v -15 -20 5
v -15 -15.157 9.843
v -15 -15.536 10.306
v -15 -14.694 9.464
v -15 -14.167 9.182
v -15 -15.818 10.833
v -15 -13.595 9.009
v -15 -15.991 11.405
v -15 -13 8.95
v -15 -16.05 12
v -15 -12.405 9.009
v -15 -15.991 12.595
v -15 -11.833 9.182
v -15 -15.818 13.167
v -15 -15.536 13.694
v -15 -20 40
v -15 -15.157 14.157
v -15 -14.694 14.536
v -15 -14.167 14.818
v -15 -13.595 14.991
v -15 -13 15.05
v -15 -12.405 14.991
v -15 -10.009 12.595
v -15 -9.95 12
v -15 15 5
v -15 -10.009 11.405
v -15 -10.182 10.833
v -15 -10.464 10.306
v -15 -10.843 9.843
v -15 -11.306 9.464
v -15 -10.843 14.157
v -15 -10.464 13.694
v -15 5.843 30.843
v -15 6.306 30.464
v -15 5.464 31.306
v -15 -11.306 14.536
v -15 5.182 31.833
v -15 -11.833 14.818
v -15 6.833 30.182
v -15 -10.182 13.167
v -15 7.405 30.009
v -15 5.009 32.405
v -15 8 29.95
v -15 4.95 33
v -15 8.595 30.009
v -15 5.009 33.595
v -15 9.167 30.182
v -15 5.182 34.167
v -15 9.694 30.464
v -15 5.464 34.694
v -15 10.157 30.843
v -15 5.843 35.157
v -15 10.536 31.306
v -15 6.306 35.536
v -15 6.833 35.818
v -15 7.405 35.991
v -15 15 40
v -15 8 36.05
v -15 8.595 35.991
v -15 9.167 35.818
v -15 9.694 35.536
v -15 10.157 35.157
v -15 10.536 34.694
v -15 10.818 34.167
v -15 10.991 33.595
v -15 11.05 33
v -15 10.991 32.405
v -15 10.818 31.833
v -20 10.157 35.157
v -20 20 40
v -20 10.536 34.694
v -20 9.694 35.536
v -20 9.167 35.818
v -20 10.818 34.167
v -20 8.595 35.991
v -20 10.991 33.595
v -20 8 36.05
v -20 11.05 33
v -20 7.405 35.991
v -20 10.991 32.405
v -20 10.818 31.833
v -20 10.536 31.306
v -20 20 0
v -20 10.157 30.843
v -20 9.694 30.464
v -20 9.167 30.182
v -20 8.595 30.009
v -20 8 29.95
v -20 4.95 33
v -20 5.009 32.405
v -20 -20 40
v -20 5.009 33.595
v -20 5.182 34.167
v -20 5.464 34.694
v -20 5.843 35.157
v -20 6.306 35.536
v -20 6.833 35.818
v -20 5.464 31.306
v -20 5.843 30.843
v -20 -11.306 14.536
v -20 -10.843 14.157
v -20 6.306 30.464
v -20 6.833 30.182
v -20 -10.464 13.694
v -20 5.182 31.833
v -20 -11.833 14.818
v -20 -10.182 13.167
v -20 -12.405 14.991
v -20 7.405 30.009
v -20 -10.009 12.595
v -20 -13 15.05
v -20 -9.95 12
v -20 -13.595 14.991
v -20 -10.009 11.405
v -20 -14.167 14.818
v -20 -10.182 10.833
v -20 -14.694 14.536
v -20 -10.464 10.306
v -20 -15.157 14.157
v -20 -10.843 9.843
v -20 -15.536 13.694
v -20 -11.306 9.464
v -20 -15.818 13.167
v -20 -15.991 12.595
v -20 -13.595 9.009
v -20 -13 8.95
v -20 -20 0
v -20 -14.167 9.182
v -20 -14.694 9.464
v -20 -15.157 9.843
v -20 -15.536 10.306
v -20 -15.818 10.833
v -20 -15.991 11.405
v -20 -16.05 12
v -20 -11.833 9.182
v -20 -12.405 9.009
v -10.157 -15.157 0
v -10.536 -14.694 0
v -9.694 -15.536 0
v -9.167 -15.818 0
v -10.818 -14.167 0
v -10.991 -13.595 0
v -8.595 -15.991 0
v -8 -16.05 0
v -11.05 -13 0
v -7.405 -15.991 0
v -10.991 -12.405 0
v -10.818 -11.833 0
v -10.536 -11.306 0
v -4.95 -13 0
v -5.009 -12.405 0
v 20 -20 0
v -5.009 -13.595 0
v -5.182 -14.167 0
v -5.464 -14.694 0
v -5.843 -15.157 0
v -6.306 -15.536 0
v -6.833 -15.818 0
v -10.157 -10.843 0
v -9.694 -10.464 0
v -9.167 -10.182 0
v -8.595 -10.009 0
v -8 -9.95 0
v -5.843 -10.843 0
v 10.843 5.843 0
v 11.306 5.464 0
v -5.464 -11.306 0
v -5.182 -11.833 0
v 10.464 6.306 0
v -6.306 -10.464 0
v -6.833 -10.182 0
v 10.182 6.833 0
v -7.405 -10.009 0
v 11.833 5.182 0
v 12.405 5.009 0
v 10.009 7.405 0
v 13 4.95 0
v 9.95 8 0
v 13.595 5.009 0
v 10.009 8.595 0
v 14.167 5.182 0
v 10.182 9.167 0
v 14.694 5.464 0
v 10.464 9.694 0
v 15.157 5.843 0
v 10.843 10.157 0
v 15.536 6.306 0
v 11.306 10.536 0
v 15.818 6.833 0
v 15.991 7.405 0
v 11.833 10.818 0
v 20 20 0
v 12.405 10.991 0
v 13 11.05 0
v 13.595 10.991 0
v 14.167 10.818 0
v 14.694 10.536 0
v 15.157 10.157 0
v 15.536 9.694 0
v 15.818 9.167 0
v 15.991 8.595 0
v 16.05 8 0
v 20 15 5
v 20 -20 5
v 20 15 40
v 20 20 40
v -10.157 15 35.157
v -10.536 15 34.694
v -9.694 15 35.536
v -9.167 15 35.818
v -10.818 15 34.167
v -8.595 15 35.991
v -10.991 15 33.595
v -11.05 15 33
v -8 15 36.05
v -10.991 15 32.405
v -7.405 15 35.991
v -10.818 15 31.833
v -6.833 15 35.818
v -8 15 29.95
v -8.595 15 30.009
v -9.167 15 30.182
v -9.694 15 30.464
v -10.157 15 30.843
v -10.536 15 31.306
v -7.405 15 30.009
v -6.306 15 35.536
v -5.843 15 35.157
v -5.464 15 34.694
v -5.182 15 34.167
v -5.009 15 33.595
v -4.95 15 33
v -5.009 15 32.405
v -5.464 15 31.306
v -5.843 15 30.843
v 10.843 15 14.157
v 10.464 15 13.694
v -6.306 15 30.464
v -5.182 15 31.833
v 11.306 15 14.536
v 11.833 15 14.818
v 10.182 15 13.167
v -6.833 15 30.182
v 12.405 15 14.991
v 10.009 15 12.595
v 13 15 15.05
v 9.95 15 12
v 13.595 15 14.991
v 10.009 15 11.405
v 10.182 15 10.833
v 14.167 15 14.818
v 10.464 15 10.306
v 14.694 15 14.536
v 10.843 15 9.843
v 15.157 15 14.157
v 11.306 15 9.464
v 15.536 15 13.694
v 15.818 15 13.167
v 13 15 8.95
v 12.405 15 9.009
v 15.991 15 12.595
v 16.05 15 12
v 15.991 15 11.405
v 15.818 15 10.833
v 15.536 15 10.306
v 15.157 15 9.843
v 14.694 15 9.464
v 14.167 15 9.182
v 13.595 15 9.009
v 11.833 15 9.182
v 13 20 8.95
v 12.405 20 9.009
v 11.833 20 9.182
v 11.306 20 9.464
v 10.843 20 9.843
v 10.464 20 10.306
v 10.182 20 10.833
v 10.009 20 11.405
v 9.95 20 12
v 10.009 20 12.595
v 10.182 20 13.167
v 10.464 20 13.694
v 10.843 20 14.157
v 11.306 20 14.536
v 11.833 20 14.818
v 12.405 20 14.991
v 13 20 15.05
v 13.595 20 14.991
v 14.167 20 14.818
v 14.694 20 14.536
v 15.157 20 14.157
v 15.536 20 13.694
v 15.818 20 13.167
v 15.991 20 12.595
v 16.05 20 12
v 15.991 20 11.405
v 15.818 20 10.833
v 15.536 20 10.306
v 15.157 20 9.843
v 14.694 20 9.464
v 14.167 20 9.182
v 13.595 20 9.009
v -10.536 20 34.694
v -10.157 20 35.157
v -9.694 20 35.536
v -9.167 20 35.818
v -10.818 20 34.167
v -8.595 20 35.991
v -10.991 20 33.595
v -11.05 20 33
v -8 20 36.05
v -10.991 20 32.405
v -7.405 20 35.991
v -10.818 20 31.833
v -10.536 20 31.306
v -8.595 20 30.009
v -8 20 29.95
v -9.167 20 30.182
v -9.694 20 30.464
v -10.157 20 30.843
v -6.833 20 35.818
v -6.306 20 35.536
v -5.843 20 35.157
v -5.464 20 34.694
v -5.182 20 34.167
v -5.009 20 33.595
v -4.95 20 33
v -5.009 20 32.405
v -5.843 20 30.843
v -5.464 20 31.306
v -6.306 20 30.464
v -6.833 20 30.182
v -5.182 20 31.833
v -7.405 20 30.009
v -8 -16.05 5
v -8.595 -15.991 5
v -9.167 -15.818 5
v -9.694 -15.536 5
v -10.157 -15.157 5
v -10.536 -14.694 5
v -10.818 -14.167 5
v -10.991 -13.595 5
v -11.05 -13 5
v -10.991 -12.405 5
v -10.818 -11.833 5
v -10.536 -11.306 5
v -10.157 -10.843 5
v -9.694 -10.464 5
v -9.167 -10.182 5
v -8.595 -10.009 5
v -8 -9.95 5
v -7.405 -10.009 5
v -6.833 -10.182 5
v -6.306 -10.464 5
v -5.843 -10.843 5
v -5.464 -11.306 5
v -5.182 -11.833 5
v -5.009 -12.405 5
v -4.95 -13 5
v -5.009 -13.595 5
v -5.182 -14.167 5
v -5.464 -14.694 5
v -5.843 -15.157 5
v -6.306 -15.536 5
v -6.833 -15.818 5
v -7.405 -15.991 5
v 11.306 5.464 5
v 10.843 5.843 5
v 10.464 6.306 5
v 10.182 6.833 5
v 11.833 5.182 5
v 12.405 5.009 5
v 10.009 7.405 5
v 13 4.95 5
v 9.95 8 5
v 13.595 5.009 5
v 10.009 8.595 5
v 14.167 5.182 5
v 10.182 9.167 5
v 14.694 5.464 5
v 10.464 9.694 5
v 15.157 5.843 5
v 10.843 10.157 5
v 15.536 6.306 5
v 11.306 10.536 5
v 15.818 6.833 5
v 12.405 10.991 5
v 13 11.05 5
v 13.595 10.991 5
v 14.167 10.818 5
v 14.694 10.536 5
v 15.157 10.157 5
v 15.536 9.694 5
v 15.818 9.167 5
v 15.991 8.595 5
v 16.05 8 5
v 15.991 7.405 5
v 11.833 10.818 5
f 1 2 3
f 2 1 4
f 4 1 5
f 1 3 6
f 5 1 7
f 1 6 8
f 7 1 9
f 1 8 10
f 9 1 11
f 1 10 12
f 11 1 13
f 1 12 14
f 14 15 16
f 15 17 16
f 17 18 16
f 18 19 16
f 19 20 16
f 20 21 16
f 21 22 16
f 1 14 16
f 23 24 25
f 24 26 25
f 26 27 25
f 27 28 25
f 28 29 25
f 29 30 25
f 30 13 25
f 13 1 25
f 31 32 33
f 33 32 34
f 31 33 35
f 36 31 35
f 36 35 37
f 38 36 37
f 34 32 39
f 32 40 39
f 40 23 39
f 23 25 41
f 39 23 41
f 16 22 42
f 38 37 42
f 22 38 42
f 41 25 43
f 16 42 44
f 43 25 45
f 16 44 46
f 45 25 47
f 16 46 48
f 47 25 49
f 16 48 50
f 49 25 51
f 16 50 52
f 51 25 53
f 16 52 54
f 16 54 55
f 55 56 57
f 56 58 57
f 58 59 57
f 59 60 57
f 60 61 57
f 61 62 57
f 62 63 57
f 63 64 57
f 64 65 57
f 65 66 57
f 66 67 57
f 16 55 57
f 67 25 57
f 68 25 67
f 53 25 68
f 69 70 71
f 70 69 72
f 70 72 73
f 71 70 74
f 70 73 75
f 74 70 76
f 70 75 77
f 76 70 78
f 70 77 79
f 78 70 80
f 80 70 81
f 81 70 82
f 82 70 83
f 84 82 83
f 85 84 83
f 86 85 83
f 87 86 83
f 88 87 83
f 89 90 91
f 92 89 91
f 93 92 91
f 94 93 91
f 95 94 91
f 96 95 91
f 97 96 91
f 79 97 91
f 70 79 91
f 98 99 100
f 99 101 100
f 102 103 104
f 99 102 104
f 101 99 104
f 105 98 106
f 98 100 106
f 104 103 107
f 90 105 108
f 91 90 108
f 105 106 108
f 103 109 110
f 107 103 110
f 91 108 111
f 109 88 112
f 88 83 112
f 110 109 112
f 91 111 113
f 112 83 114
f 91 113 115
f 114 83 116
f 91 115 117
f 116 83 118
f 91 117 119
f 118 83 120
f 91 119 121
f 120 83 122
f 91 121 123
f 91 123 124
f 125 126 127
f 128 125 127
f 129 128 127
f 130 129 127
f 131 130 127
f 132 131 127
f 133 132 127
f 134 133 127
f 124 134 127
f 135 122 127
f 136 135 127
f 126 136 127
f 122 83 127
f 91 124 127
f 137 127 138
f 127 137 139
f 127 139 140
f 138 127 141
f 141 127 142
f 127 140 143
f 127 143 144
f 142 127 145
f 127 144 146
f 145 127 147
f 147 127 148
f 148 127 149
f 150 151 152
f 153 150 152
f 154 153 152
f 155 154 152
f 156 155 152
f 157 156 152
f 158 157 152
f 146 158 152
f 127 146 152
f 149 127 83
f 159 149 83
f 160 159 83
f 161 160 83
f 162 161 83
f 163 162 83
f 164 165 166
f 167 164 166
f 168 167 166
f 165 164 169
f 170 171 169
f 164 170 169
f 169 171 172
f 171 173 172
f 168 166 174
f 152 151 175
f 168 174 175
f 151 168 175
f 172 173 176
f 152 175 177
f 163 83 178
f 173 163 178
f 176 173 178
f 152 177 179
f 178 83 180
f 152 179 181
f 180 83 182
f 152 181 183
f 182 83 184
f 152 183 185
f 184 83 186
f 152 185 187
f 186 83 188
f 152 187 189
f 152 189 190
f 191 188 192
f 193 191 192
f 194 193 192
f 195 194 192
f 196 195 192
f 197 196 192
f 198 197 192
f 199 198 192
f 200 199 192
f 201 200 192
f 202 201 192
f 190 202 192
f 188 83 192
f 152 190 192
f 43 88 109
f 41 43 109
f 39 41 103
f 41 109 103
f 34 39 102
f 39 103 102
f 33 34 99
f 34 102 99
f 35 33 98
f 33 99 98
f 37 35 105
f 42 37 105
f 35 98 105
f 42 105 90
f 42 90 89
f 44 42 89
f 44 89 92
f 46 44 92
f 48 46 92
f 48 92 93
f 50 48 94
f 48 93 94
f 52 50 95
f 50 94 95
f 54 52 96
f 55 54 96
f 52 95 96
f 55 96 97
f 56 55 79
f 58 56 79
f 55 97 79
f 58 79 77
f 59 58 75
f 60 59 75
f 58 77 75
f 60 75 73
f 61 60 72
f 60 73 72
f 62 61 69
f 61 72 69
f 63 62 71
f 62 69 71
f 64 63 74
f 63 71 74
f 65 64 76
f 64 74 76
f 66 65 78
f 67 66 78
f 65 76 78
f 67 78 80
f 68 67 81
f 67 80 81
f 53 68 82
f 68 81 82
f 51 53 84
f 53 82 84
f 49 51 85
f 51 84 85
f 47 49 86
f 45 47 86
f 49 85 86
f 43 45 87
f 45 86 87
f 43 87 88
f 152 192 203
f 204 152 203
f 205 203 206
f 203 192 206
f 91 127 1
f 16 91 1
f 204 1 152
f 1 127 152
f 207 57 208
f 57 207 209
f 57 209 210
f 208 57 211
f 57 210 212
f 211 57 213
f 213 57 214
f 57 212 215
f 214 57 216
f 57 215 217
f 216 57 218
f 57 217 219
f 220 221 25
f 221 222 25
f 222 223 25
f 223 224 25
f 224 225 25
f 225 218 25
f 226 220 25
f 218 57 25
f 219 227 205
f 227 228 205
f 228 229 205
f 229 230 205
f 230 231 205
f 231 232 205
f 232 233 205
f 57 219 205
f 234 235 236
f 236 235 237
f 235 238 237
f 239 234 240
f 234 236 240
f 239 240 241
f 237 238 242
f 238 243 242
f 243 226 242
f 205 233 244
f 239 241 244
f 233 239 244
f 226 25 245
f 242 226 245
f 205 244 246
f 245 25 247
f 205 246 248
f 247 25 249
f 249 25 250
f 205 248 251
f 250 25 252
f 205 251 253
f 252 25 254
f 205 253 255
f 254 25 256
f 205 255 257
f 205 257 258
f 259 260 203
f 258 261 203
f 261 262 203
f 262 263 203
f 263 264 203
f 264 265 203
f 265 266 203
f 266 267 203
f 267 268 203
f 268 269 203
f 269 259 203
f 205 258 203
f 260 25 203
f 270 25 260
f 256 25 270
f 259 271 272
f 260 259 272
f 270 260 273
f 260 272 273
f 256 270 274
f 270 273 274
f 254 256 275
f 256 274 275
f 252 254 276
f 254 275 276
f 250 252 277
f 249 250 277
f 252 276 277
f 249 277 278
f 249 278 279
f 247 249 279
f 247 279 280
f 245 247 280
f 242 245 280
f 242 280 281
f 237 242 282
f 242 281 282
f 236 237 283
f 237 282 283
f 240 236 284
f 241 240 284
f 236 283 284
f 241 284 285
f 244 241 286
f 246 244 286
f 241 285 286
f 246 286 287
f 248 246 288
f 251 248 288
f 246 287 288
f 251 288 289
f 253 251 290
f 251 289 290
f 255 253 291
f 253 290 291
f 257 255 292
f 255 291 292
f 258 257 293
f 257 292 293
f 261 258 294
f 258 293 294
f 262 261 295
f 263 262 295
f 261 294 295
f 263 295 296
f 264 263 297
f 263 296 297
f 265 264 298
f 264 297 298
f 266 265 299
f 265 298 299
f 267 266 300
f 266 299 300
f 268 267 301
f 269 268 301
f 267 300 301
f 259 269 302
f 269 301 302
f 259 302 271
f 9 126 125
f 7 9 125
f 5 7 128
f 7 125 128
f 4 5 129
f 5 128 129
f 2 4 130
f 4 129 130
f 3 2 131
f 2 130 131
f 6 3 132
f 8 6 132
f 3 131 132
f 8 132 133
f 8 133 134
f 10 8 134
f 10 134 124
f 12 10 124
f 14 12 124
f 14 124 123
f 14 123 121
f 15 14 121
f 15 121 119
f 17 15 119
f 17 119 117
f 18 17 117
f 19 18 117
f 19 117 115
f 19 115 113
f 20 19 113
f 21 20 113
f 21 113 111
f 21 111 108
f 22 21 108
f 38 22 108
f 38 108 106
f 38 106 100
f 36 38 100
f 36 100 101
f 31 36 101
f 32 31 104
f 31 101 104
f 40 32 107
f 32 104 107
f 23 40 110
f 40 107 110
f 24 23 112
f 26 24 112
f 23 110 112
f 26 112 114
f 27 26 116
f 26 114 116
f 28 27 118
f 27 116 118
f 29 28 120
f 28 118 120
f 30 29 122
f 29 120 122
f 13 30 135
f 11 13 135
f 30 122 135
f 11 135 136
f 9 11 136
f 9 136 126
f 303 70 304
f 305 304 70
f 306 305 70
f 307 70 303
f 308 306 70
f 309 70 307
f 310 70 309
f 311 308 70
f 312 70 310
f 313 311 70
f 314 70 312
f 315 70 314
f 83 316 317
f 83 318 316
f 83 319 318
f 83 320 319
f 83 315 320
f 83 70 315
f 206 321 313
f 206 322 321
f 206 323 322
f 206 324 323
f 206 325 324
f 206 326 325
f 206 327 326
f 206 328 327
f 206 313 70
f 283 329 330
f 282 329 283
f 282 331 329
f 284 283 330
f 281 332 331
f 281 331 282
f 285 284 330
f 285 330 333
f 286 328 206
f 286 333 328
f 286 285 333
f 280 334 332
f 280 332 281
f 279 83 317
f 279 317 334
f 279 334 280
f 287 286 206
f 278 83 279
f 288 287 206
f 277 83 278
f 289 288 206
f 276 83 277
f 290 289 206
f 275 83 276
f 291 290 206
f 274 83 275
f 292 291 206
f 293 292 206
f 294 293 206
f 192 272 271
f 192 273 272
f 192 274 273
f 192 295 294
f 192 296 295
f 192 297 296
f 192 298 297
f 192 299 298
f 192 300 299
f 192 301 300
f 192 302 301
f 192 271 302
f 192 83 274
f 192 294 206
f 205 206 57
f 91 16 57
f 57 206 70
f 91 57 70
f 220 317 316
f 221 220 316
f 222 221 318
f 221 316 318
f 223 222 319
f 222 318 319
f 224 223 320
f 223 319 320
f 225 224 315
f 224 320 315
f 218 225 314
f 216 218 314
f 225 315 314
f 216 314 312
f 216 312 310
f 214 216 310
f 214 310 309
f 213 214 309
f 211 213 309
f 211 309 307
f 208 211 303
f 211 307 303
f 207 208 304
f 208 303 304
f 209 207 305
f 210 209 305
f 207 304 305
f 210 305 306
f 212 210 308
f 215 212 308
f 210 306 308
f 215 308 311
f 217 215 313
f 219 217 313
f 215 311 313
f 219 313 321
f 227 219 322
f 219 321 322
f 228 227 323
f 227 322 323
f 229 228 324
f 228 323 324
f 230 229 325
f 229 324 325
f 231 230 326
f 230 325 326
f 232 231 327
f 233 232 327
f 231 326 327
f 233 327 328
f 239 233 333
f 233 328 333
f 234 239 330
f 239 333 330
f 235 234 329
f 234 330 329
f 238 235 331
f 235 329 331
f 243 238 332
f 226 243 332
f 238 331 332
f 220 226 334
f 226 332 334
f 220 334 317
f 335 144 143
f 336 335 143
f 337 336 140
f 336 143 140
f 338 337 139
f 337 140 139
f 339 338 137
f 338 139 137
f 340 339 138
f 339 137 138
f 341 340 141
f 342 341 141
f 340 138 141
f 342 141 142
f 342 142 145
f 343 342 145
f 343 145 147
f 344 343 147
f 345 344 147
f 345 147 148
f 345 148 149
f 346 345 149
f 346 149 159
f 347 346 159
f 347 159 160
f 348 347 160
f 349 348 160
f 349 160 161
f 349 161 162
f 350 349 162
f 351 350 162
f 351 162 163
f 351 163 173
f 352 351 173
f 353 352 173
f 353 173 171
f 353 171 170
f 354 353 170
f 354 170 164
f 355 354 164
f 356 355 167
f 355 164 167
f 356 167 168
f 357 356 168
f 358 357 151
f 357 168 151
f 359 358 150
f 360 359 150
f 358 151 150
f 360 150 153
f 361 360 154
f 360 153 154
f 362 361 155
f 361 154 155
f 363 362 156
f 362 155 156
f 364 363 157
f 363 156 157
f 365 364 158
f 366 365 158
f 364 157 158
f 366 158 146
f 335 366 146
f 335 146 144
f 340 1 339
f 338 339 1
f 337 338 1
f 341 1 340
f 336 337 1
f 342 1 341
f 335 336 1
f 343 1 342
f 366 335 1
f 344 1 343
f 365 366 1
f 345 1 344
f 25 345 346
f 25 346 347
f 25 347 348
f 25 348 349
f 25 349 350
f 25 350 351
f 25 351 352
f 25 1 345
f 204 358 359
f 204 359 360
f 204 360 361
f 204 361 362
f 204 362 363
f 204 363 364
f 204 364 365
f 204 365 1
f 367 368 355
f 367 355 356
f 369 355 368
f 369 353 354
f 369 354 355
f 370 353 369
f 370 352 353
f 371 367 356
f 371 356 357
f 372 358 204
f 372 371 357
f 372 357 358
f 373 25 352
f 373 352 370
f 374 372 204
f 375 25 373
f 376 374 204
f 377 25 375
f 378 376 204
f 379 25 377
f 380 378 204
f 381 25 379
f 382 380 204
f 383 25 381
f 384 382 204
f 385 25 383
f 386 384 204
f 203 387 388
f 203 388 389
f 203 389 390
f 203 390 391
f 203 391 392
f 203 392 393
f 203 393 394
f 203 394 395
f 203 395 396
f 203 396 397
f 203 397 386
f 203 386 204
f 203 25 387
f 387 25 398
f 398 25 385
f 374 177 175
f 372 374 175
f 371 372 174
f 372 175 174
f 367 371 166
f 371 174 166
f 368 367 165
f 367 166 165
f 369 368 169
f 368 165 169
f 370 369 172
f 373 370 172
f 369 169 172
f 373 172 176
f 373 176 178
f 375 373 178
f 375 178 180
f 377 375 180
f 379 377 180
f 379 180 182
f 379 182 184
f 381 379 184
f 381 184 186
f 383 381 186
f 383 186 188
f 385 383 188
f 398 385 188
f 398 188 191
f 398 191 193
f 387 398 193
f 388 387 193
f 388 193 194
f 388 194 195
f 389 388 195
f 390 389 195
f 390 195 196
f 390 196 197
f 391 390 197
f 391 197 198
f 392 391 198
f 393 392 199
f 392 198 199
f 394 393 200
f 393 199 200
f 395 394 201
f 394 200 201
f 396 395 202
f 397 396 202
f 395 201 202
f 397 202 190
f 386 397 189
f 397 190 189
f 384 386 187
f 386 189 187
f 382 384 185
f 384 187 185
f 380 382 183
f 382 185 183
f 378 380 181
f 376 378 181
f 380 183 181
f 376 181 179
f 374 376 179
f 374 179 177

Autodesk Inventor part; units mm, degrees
ref_plane "YZ Plane" through (0, 0, 0) normal (1, 0, 0) x (0, 1, 0)
ref_plane "XZ Plane" through (0, 0, 0) normal (0, 1, 0) x (-1, 0, 0)
ref_plane "XY Plane" through (0, 0, 0) normal (0, 0, 1) x (1, 0, 0)
sketch "Skizze1" plane through (0, 0, 0) normal (0, 0, 1) x (1, 0, 0)
  line L0 (-20, -20) -> (20, -20)
  line L1 (20, -20) -> (20, 20)
  line L2 (20, 20) -> (-20, 20)
  line L3 (-20, 20) -> (-20, -20)
  line L4 (-20, -20) -> (20, 20) construction
  line L5 (20, -20) -> (-20, 20) construction
  point P0 (0, 0)
  dimension "d0" = 40
  dimension "d1" = 40
extrude "Extrusion1" add sketch "Skizze1" along normal blind 5
sketch "Skizze2" plane through (-20, -20, 0) normal (-1, 0, 0) x (0, 0, 1)
  line L0 (5, 40) -> (5, 0) projected
  line L1 (0, 0) -> (40, 0)
  line L2 (40, 0) -> (40, 40)
  line L3 (40, 40) -> (0, 40)
  line L4 (0, 40) -> (0, 0)
  point P0 (0, 20)
  dimension "d4" = 40
  dimension "d5" = 40
extrude "Extrusion2" add sketch "Skizze2" against normal blind 5 contours L3 L2 L1 L0
sketch "Skizze3" plane through (-20, 20, 0) normal (0, 1, 0) x (1, 0, 0)
  line L0 (40, 0) -> (0, 0) projected
  line L1 (0, 0) -> (0, -40) projected
  line L2 (5, -5) -> (5, -40) projected
  line L3 (40, -5) -> (5, -5) projected
  line L4 (0, 0) -> (40, 0)
  line L5 (40, 0) -> (40, -40)
  line L6 (40, -40) -> (0, -40)
  line L7 (0, -40) -> (0, 0)
  point P0 (20, 0)
  point P1 (5, -40)
  point P2 (0, -5)
  dimension "d8" = 40
  dimension "d9" = 40
extrude "Extrusion3" add sketch "Skizze3" against normal blind 5 contours L5 L6 L2 L3
sketch "Skizze4" plane through (-15, -20, 0) normal (1, 0, 0) x (0, 0, -1)
  line L0 (-5, 35) -> (-40, 35) projected
  line L1 (-40, 40) -> (-40, 0) projected
  line L2 (-40, 0) -> (-5, 0) projected
  line L3 (-5, 40) -> (-5, 0) projected
  point P0 (0, 20)
  point P1 (-33, 28)
  point P2 (-12, 7)
  dimension "d12" = 7
  dimension "d13" = 7
  dimension "d14" = 7
  dimension "d15" = 7
hole "Bohrung1" at (-15, 8, 33) at (-15, -13, 12) direction (-1, 0, 0) diameter 6.1 end through all
sketch "Skizze5" plane through (-20, 15, 0) normal (0, -1, 0) x (1, 0, 0)
  line L0 (40, 5) -> (40, 40) projected
  line L1 (40, 40) -> (5, 40) projected
  line L2 (5, 5) -> (5, 40) projected
  line L3 (40, 5) -> (5, 5) projected
  point P0 (20, 0)
  point P1 (12, 33)
  point P2 (33, 12)
  dimension "d23" = 7
  dimension "d24" = 7
  dimension "d25" = 7
  dimension "d26" = 7
hole "Bohrung2" at (-8, 15, 33) at (13, 15, 12) direction (0, 1, 0) diameter 6.1 end through all
sketch "Skizze6" plane through (0, 0, 5) normal (0, 0, 1) x (1, 0, 0)
  line L0 (20, 15) -> (-15, 15) projected
  line L1 (-15, 15) -> (-15, -20) projected
  line L2 (-15, -20) -> (20, -20) projected
  line L3 (20, -20) -> (20, 15) projected
  point P0 (0, 0)
  point P1 (-8, -13)
  point P2 (13, 8)
  dimension "d34" = 7
  dimension "d35" = 7
  dimension "d36" = 7
  dimension "d37" = 7
hole "Bohrung3" at (-8, -13, 5) at (13, 8, 5) direction (0, 0, -1) diameter 6.1 end through all
equation "\"d5\" = d4"
equation "\"d8\" = d9"
equation "\"d13\" = d12"
equation "\"d14\" = d12"
equation "\"d15\" = d12"
equation "\"d24\" = d23"
equation "\"d25\" = d23"
equation "\"d26\" = d23"
equation "\"d35\" = d34"
equation "\"d36\" = d34"
equation "\"d37\" = d34"
properties part number "Ecken_Box"
